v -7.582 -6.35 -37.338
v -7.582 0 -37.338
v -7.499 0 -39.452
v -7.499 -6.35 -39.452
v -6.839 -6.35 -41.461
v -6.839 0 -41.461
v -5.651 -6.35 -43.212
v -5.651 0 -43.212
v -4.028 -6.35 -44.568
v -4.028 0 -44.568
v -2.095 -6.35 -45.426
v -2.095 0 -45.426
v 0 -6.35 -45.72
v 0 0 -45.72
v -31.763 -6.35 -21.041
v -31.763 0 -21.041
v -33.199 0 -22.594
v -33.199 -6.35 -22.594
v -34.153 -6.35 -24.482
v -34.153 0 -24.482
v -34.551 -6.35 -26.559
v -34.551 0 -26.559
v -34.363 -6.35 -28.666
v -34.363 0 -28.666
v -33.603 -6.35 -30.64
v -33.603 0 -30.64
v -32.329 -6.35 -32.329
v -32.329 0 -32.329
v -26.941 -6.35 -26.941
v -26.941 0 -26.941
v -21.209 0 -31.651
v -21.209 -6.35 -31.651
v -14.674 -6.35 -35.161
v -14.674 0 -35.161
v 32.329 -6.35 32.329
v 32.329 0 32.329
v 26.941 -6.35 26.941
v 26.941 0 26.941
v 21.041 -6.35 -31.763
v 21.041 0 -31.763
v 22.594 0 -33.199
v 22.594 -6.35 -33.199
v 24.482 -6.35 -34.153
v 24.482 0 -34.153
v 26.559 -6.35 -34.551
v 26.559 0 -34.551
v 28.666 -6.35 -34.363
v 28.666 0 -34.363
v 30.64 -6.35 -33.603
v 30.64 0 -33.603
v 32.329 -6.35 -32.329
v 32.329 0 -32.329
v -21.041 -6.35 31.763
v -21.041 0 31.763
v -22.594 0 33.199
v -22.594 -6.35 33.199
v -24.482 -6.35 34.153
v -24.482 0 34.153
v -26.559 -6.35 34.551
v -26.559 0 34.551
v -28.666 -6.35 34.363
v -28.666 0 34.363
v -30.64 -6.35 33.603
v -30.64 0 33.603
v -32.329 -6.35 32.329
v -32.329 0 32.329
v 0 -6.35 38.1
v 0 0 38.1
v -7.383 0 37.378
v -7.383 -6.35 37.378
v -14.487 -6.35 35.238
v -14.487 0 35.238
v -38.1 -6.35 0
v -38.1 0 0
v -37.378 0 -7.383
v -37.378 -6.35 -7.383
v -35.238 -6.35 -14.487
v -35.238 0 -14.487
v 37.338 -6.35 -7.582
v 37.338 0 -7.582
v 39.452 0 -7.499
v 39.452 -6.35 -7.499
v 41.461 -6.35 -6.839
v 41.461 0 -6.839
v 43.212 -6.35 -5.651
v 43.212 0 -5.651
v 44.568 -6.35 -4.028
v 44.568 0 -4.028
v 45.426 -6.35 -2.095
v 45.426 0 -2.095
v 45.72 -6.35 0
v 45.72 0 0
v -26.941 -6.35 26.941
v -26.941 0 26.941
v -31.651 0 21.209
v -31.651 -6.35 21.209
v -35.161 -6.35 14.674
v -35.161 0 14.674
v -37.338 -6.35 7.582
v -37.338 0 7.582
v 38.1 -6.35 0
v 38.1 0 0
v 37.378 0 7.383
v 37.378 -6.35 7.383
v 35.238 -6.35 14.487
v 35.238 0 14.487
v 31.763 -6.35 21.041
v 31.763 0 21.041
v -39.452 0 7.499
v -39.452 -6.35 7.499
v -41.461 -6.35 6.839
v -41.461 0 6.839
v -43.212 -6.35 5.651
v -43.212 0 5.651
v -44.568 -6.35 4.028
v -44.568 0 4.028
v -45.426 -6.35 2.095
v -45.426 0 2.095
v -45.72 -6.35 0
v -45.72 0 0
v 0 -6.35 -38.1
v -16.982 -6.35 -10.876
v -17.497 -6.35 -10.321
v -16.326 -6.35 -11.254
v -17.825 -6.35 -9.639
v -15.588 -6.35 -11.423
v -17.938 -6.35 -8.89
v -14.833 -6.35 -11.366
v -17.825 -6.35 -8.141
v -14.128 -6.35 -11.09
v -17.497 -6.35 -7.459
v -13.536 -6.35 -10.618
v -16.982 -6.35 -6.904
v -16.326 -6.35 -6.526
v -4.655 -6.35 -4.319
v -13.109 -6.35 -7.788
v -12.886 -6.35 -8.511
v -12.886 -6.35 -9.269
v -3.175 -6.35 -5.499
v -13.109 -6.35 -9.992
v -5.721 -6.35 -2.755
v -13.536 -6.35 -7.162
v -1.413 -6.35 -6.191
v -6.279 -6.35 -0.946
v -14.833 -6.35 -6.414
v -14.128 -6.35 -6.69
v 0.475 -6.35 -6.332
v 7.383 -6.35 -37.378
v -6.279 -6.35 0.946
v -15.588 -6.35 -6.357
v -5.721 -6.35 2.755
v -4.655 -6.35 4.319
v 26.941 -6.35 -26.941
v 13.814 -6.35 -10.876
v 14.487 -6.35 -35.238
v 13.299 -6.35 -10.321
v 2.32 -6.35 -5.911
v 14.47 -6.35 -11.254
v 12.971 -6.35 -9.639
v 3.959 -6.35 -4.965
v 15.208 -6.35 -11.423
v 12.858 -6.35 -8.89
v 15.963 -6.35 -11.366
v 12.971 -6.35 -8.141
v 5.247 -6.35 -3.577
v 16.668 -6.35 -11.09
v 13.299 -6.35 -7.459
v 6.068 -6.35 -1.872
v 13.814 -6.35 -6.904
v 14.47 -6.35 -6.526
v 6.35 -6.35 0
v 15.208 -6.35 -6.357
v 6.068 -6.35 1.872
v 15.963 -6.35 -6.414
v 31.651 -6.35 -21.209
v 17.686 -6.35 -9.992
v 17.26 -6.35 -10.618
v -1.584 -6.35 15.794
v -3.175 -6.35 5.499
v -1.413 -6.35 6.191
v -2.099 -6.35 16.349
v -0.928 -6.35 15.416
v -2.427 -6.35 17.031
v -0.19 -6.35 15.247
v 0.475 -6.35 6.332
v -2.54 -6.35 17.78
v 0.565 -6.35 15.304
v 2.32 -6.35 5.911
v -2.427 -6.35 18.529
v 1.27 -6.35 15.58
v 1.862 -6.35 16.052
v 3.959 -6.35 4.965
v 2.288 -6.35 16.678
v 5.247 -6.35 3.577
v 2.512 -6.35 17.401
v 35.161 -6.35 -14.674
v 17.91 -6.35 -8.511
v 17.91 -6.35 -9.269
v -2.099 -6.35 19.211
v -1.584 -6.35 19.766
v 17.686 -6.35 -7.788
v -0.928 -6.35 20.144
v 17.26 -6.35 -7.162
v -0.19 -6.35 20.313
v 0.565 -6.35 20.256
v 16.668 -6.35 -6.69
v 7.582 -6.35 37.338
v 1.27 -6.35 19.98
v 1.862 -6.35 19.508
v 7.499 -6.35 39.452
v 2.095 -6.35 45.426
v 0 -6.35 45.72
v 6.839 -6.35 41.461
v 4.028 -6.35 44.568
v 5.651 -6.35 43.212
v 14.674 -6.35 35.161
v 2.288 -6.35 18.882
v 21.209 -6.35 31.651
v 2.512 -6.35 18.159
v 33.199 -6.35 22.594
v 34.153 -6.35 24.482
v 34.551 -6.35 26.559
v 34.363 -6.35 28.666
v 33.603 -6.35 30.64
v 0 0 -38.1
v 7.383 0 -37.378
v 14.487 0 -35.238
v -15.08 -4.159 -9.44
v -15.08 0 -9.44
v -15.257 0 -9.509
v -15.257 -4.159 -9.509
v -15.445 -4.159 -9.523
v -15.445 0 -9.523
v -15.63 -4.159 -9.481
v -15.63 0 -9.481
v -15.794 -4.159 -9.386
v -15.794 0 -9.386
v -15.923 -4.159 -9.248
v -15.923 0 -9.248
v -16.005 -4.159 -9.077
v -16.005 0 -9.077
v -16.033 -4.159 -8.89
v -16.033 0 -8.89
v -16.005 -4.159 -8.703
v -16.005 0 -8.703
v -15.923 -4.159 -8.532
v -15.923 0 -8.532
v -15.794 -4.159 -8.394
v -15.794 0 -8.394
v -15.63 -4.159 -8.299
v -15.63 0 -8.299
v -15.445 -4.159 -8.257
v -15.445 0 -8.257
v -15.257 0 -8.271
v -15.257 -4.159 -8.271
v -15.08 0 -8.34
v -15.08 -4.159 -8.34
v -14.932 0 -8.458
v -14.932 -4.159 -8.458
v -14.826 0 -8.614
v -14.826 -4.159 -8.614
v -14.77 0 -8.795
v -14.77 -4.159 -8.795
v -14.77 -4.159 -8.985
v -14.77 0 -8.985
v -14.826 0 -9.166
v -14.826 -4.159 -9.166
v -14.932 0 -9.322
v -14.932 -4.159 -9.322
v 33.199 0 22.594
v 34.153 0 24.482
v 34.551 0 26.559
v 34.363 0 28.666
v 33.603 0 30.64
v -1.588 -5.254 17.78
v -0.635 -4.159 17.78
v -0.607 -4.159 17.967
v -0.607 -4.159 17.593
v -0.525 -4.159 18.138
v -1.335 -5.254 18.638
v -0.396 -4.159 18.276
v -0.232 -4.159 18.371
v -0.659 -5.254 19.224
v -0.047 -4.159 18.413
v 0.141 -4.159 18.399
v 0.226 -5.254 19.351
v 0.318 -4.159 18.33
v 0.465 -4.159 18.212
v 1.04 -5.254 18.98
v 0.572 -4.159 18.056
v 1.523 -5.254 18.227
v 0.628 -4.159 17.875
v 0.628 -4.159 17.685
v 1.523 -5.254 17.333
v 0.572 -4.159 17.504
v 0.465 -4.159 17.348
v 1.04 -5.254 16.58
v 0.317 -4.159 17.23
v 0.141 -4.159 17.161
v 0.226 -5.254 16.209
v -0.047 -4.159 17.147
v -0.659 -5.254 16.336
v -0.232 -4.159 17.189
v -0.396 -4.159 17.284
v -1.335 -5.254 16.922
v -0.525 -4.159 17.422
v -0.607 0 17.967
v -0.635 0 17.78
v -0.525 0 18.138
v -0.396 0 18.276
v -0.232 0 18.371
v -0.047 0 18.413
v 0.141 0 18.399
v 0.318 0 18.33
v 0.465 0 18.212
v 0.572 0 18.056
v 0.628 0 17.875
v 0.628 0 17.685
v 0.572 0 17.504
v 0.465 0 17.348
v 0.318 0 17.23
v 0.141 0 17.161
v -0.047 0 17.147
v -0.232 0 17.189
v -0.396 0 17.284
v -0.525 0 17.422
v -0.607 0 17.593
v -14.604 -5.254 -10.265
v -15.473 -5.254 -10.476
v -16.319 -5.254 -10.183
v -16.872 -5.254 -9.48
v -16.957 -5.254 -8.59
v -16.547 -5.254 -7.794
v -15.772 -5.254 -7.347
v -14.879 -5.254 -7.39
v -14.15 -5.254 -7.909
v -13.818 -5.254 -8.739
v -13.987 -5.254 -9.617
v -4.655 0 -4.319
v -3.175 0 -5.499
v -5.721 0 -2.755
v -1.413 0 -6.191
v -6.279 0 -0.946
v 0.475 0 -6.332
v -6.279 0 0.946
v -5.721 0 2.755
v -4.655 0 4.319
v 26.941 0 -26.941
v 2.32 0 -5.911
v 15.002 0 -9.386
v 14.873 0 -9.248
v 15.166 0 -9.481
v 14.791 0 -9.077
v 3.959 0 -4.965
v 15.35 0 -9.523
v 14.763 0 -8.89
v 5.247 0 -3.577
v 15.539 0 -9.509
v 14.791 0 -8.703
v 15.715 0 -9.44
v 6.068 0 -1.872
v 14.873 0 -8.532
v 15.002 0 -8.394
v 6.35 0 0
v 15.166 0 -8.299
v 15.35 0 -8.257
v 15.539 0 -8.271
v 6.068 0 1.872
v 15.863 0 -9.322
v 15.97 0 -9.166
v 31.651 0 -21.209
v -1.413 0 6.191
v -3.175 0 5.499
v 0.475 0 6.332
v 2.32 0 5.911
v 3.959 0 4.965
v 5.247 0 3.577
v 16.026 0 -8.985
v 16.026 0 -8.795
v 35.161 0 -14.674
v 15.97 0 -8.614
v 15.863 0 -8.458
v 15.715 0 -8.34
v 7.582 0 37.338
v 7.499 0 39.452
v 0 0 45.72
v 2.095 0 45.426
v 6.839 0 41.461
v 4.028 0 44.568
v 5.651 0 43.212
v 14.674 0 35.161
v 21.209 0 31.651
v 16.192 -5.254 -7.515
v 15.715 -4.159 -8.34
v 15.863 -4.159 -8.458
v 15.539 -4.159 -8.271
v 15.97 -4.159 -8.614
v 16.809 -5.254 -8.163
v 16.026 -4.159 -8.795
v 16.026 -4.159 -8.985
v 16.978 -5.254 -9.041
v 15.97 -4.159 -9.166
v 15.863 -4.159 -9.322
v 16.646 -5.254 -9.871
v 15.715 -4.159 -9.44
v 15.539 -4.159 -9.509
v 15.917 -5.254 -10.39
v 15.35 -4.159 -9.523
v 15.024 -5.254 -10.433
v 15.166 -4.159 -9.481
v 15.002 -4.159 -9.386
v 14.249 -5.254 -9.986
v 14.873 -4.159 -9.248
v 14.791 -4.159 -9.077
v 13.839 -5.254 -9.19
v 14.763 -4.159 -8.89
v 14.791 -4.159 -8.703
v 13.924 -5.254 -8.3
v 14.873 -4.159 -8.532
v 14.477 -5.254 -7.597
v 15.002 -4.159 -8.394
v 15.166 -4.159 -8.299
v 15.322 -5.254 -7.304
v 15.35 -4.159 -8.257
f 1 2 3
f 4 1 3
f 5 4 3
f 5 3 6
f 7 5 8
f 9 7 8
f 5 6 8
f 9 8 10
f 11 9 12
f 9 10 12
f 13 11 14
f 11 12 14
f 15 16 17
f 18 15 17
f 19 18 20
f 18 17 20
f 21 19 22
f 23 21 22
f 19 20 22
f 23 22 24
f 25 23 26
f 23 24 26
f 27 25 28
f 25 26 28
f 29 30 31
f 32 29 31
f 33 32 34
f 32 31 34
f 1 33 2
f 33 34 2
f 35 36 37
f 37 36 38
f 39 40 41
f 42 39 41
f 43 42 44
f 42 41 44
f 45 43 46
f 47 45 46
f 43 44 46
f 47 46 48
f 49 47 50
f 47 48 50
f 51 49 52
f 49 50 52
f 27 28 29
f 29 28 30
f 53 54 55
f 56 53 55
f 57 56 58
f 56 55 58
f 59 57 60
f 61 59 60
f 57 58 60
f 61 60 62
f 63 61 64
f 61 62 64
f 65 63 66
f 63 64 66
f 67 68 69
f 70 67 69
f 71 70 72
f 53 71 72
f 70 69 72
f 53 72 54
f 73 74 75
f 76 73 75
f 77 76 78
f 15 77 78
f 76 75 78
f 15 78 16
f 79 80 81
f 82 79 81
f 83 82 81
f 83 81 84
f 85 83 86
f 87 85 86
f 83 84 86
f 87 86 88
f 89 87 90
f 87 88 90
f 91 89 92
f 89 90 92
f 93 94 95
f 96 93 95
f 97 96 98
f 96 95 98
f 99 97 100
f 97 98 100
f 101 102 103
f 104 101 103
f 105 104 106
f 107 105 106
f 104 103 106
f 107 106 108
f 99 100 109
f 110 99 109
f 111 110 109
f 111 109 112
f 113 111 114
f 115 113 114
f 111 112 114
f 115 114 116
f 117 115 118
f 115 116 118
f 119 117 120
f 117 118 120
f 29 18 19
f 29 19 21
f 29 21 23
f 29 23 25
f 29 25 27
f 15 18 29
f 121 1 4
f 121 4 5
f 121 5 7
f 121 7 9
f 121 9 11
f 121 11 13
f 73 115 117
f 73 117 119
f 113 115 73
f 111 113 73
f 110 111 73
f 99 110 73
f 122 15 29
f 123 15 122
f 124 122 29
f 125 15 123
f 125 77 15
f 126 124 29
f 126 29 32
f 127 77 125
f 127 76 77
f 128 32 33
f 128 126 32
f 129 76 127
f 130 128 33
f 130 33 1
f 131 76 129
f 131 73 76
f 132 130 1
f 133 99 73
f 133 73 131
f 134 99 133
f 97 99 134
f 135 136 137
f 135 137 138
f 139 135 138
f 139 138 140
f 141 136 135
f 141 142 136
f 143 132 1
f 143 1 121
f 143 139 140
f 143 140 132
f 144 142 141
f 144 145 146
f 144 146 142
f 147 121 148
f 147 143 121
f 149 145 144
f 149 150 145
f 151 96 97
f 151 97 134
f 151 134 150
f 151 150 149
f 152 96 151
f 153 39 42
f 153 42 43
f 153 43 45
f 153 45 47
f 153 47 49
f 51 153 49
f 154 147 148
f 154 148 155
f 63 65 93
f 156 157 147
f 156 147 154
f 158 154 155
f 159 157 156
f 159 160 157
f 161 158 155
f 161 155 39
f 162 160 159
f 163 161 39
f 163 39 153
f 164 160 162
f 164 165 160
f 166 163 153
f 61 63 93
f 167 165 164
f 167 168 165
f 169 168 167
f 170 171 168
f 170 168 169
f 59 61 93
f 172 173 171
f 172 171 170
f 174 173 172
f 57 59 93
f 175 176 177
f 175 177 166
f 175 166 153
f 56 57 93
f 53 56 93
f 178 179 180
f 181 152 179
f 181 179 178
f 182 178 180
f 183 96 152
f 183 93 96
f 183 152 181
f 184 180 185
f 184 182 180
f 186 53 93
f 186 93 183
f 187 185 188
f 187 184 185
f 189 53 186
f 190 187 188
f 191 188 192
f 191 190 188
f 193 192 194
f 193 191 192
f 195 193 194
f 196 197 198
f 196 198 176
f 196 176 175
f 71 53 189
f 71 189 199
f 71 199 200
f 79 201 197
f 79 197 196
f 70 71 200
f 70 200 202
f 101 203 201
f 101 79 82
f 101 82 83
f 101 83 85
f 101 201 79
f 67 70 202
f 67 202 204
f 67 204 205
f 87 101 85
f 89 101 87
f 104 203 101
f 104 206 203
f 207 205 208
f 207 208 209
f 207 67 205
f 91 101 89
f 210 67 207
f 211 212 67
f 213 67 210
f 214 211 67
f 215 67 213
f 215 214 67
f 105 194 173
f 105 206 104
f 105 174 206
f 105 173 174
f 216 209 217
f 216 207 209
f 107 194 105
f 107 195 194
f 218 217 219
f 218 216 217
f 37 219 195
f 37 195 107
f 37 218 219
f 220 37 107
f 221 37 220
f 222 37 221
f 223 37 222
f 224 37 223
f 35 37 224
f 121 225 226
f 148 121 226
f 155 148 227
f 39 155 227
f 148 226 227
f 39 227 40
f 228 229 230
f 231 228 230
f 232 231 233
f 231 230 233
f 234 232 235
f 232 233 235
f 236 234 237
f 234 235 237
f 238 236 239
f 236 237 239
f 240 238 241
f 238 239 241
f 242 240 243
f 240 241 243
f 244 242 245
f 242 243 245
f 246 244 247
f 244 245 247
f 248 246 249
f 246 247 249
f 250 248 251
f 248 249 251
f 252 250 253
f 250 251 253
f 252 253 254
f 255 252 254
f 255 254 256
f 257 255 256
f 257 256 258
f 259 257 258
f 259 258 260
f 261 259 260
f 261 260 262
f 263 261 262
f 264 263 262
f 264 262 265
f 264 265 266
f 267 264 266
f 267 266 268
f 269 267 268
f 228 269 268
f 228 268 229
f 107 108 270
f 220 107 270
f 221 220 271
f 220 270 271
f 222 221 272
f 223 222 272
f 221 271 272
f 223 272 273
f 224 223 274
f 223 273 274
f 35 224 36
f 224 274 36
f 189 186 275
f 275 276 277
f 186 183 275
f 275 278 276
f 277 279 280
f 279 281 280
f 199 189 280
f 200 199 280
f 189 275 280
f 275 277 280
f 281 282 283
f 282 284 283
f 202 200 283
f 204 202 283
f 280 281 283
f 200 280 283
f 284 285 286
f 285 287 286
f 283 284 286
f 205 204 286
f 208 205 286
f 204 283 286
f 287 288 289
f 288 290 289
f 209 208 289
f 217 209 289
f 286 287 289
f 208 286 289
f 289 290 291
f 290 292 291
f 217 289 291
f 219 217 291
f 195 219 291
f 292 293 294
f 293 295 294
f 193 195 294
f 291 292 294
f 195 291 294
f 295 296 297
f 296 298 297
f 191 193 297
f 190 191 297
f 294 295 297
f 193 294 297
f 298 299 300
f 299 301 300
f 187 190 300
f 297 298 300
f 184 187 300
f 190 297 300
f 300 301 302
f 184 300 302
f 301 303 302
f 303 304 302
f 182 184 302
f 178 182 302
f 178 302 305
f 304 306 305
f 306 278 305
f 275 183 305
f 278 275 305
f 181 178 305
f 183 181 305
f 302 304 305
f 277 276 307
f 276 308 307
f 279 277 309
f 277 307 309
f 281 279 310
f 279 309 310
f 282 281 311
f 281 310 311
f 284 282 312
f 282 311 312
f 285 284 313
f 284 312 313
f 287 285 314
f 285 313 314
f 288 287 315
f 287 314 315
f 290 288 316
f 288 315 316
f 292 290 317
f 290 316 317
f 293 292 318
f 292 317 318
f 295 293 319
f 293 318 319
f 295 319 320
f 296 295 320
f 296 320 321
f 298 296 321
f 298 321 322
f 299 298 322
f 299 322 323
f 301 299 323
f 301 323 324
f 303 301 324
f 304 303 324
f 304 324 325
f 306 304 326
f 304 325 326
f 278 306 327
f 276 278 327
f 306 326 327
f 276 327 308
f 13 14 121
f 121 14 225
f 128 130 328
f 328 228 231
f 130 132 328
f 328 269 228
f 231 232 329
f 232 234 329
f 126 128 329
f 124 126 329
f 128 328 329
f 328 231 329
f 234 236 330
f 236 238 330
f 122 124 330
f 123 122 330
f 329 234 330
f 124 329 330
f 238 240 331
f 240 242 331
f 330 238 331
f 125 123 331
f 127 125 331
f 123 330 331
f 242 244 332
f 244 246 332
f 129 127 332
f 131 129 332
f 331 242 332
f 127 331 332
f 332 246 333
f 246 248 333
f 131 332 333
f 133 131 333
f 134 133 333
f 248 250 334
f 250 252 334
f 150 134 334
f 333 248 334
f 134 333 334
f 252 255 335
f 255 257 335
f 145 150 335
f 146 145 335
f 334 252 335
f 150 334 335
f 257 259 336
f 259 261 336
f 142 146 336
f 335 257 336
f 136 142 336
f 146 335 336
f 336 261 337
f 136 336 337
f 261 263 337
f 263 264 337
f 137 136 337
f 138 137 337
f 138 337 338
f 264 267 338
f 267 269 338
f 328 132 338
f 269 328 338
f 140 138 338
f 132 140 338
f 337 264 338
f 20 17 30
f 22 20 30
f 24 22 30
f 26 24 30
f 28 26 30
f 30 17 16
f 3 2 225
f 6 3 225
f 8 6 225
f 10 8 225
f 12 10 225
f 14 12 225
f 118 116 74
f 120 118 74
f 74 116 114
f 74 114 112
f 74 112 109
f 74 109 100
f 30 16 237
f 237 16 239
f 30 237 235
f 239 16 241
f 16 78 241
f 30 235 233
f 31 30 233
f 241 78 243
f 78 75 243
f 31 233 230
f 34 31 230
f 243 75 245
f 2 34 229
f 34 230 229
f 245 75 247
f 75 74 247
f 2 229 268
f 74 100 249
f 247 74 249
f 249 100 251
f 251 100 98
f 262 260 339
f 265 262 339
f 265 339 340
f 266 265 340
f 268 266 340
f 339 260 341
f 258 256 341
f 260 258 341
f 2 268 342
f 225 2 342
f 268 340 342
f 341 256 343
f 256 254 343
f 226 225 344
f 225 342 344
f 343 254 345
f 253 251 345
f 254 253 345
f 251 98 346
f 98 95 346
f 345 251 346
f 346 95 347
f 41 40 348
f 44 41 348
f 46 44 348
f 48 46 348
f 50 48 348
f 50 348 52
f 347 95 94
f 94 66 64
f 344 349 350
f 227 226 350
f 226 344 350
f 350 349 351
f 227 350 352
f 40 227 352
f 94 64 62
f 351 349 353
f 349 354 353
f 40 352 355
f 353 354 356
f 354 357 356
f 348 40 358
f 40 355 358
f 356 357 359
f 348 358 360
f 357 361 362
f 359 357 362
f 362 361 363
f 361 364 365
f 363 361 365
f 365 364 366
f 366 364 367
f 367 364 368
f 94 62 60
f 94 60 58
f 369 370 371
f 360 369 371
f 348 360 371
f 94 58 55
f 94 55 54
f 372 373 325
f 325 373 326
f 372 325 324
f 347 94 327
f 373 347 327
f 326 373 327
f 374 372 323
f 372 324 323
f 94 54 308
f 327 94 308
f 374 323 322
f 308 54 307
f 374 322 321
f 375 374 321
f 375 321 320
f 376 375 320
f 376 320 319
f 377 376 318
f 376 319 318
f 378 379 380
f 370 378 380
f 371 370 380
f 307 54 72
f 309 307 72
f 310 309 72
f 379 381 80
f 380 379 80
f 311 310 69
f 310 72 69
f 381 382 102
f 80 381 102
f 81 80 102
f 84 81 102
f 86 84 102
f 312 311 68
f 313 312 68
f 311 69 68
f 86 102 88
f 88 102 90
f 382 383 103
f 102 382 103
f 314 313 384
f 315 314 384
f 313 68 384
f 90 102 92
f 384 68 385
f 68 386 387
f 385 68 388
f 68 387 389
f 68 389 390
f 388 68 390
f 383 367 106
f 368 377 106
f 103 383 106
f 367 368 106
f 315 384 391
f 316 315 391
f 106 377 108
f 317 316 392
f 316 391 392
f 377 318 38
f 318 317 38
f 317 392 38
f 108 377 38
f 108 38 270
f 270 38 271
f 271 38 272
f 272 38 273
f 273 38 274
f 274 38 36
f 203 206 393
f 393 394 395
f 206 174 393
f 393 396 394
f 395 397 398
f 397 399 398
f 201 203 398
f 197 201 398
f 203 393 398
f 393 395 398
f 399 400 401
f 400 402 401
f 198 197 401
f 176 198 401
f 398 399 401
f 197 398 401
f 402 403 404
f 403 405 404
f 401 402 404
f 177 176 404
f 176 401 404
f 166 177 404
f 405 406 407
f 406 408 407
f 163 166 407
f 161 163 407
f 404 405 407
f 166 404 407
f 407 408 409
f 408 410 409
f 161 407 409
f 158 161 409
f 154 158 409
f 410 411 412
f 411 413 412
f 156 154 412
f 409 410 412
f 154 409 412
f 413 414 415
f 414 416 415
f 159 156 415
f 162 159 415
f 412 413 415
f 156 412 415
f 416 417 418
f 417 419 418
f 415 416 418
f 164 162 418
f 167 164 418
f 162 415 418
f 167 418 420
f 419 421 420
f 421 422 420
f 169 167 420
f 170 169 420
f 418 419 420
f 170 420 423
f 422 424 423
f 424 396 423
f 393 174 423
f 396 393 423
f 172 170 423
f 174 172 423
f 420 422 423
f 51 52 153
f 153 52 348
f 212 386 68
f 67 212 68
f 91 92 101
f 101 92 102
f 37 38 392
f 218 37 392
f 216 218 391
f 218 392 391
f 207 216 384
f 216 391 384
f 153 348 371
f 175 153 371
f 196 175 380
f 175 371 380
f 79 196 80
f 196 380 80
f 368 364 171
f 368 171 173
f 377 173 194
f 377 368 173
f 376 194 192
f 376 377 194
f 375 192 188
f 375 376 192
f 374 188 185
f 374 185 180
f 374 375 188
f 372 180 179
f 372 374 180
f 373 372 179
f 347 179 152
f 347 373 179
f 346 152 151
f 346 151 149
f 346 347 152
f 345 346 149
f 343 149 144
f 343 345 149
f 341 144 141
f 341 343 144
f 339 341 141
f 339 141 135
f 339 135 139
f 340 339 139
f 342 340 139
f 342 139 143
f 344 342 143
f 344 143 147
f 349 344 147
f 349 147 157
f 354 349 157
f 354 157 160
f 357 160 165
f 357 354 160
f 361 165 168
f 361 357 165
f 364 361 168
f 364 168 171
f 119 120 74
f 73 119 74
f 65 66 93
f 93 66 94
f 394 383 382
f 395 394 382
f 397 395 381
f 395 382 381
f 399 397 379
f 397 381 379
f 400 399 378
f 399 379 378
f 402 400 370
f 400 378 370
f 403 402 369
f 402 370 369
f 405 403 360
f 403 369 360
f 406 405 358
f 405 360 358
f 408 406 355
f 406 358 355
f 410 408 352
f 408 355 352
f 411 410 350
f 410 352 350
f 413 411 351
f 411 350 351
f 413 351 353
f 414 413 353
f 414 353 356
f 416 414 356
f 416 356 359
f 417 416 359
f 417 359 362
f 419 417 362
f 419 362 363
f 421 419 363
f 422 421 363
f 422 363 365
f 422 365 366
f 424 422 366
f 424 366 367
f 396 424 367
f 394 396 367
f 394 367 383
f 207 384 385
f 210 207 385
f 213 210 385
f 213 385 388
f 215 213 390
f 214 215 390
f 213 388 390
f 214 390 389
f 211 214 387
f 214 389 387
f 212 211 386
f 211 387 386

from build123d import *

# Parameters (mm, degrees)
F0_R            = 6.35
F1_DEPTH        = 6.35
F3_D            = 1.27
F3_DEPTH        = 6.35
F3_CSINK_D      = 5.08
F3_CSINK_ANGLE  = 82
F3_TIP          = 0.3815464931
F3_COPIES_COUNT = 3


# Not quite as in the source:
# - a pattern or mirror of a feature is missing from the dataset's text; its kind, count and spacing are read off the source's solid


with BuildPart() as f1:
    # F0 (on Front) → F1 (new body)
    with BuildSketch(Plane.XZ):
        with BuildLine():
            ThreePointArc((37.338, -7.5818042708), (37.9090213538, -3.81), (38.1, 0))
            ThreePointArc((38.1, 0), (36.4813928036, 10.9871733904), (31.7630982094, 21.0408077825))
            ThreePointArc((31.7630982094, 21.0408077825), (29.4998029037, 24.1116492311), (26.9407683632, 26.9407683632))
            ThreePointArc((26.9407683632, 26.9407683632), (18.0271354281, 33.565345049), (7.5818042708, 37.338))
            ThreePointArc((7.5818042708, 37.338), (3.81, 37.9090213538), (0, 38.1))
            ThreePointArc((0, 38.1), (-10.9871733904, 36.4813928036), (-21.0408077825, 31.7630982094))
            ThreePointArc((-21.0408077825, 31.7630982094), (-24.1116492311, 29.4998029037), (-26.9407683632, 26.9407683632))
            ThreePointArc((-26.9407683632, 26.9407683632), (-33.565345049, 18.0271354281), (-37.338, 7.5818042708))
            ThreePointArc((-37.338, 7.5818042708), (-37.9090213538, 3.81), (-38.1, 0))
            ThreePointArc((-38.1, 0), (-36.4813928036, -10.9871733904), (-31.7630982094, -21.0408077825))
            ThreePointArc((-31.7630982094, -21.0408077825), (-29.4998029037, -24.1116492311), (-26.9407683632, -26.9407683632))
            ThreePointArc((-26.9407683632, -26.9407683632), (-18.0271354281, -33.565345049), (-7.5818042708, -37.338))
            ThreePointArc((-7.5818042708, -37.338), (-3.81, -37.9090213538), (0, -38.1))
            ThreePointArc((0, -38.1), (10.9871733904, -36.4813928036), (21.0408077825, -31.7630982094))
            ThreePointArc((21.0408077825, -31.7630982094), (24.1116492311, -29.4998029037), (26.9407683632, -26.9407683632))
            ThreePointArc((26.9407683632, -26.9407683632), (33.565345049, -18.0271354281), (37.338, -7.5818042708))
        make_face()
        Circle(F0_R, mode=Mode.SUBTRACT)
        with BuildLine():
            ThreePointArc((-26.9407683632, 26.9407683632), (-24.1116492311, 29.4998029037), (-21.0408077825, 31.7630982094))
            ThreePointArc((-21.0408077825, 31.7630982094), (-26.5592900173, 34.5512134403), (-32.3289220358, 32.3289220358))
            Line((-32.3289220358, 32.3289220358), (-26.9407683632, 26.9407683632))
        make_face()
        with BuildLine():
            ThreePointArc((0, 38.1), (3.81, 37.9090213538), (7.5818042708, 37.338))
            ThreePointArc((7.5818042708, 37.338), (5.6511432472, 43.2116513966), (0, 45.72))
            Line((0, 45.72), (0, 38.1))
        make_face()
        with BuildLine():
            ThreePointArc((26.9407683632, 26.9407683632), (29.4998029037, 24.1116492311), (31.7630982094, 21.0408077825))
            ThreePointArc((31.7630982094, 21.0408077825), (34.5512134403, 26.5592900173), (32.3289220358, 32.3289220358))
            Line((32.3289220358, 32.3289220358), (26.9407683632, 26.9407683632))
        make_face()
        with BuildLine():
            Line((45.72, 0), (38.1, 0))
            ThreePointArc((38.1, 0), (37.9090213538, -3.81), (37.338, -7.5818042708))
            ThreePointArc((37.338, -7.5818042708), (43.2116513966, -5.6511432472), (45.72, 0))
        make_face()
        with BuildLine():
            Line((32.3289220358, -32.3289220358), (26.9407683632, -26.9407683632))
            ThreePointArc((26.9407683632, -26.9407683632), (24.1116492311, -29.4998029037), (21.0408077825, -31.7630982094))
            ThreePointArc((21.0408077825, -31.7630982094), (26.5592900173, -34.5512134403), (32.3289220358, -32.3289220358))
        make_face()
        with BuildLine():
            Line((0, -45.72), (0, -38.1))
            ThreePointArc((0, -38.1), (-3.81, -37.9090213538), (-7.5818042708, -37.338))
            ThreePointArc((-7.5818042708, -37.338), (-5.6511432472, -43.2116513966), (0, -45.72))
        make_face()
        with BuildLine():
            Line((-32.3289220358, -32.3289220358), (-26.9407683632, -26.9407683632))
            ThreePointArc((-26.9407683632, -26.9407683632), (-29.4998029037, -24.1116492311), (-31.7630982094, -21.0408077825))
            ThreePointArc((-31.7630982094, -21.0408077825), (-34.5512134403, -26.5592900173), (-32.3289220358, -32.3289220358))
        make_face()
        with BuildLine():
            ThreePointArc((-38.1, 0), (-37.9090213538, 3.81), (-37.338, 7.5818042708))
            ThreePointArc((-37.338, 7.5818042708), (-43.2116513966, 5.6511432472), (-45.72, 0))
            Line((-45.72, 0), (-38.1, 0))
        make_face()
    extrude(amount=F1_DEPTH)

    # F3
    with Locations(Plane.XZ.offset(6.35)):
        with Locations((0, 17.78)):
            f3 = CounterSinkHole(F3_D / 2, F3_CSINK_D / 2, depth=F3_DEPTH, counter_sink_angle=F3_CSINK_ANGLE)
            with Locations((0, 0, -(F3_DEPTH + F3_TIP / 2))):  # 118° drill point
                Cone(0, F3_D / 2, F3_TIP, mode=Mode.SUBTRACT)

    # F3_copies: F3 ×3 about axis
    f3_copies_axis = Axis((0, 0, 0), (0, 1, 0))
    for i in range(1, F3_COPIES_COUNT):
        add(f3.rotate(f3_copies_axis, i * 360 / F3_COPIES_COUNT), mode=Mode.SUBTRACT)


solid = f1.part
